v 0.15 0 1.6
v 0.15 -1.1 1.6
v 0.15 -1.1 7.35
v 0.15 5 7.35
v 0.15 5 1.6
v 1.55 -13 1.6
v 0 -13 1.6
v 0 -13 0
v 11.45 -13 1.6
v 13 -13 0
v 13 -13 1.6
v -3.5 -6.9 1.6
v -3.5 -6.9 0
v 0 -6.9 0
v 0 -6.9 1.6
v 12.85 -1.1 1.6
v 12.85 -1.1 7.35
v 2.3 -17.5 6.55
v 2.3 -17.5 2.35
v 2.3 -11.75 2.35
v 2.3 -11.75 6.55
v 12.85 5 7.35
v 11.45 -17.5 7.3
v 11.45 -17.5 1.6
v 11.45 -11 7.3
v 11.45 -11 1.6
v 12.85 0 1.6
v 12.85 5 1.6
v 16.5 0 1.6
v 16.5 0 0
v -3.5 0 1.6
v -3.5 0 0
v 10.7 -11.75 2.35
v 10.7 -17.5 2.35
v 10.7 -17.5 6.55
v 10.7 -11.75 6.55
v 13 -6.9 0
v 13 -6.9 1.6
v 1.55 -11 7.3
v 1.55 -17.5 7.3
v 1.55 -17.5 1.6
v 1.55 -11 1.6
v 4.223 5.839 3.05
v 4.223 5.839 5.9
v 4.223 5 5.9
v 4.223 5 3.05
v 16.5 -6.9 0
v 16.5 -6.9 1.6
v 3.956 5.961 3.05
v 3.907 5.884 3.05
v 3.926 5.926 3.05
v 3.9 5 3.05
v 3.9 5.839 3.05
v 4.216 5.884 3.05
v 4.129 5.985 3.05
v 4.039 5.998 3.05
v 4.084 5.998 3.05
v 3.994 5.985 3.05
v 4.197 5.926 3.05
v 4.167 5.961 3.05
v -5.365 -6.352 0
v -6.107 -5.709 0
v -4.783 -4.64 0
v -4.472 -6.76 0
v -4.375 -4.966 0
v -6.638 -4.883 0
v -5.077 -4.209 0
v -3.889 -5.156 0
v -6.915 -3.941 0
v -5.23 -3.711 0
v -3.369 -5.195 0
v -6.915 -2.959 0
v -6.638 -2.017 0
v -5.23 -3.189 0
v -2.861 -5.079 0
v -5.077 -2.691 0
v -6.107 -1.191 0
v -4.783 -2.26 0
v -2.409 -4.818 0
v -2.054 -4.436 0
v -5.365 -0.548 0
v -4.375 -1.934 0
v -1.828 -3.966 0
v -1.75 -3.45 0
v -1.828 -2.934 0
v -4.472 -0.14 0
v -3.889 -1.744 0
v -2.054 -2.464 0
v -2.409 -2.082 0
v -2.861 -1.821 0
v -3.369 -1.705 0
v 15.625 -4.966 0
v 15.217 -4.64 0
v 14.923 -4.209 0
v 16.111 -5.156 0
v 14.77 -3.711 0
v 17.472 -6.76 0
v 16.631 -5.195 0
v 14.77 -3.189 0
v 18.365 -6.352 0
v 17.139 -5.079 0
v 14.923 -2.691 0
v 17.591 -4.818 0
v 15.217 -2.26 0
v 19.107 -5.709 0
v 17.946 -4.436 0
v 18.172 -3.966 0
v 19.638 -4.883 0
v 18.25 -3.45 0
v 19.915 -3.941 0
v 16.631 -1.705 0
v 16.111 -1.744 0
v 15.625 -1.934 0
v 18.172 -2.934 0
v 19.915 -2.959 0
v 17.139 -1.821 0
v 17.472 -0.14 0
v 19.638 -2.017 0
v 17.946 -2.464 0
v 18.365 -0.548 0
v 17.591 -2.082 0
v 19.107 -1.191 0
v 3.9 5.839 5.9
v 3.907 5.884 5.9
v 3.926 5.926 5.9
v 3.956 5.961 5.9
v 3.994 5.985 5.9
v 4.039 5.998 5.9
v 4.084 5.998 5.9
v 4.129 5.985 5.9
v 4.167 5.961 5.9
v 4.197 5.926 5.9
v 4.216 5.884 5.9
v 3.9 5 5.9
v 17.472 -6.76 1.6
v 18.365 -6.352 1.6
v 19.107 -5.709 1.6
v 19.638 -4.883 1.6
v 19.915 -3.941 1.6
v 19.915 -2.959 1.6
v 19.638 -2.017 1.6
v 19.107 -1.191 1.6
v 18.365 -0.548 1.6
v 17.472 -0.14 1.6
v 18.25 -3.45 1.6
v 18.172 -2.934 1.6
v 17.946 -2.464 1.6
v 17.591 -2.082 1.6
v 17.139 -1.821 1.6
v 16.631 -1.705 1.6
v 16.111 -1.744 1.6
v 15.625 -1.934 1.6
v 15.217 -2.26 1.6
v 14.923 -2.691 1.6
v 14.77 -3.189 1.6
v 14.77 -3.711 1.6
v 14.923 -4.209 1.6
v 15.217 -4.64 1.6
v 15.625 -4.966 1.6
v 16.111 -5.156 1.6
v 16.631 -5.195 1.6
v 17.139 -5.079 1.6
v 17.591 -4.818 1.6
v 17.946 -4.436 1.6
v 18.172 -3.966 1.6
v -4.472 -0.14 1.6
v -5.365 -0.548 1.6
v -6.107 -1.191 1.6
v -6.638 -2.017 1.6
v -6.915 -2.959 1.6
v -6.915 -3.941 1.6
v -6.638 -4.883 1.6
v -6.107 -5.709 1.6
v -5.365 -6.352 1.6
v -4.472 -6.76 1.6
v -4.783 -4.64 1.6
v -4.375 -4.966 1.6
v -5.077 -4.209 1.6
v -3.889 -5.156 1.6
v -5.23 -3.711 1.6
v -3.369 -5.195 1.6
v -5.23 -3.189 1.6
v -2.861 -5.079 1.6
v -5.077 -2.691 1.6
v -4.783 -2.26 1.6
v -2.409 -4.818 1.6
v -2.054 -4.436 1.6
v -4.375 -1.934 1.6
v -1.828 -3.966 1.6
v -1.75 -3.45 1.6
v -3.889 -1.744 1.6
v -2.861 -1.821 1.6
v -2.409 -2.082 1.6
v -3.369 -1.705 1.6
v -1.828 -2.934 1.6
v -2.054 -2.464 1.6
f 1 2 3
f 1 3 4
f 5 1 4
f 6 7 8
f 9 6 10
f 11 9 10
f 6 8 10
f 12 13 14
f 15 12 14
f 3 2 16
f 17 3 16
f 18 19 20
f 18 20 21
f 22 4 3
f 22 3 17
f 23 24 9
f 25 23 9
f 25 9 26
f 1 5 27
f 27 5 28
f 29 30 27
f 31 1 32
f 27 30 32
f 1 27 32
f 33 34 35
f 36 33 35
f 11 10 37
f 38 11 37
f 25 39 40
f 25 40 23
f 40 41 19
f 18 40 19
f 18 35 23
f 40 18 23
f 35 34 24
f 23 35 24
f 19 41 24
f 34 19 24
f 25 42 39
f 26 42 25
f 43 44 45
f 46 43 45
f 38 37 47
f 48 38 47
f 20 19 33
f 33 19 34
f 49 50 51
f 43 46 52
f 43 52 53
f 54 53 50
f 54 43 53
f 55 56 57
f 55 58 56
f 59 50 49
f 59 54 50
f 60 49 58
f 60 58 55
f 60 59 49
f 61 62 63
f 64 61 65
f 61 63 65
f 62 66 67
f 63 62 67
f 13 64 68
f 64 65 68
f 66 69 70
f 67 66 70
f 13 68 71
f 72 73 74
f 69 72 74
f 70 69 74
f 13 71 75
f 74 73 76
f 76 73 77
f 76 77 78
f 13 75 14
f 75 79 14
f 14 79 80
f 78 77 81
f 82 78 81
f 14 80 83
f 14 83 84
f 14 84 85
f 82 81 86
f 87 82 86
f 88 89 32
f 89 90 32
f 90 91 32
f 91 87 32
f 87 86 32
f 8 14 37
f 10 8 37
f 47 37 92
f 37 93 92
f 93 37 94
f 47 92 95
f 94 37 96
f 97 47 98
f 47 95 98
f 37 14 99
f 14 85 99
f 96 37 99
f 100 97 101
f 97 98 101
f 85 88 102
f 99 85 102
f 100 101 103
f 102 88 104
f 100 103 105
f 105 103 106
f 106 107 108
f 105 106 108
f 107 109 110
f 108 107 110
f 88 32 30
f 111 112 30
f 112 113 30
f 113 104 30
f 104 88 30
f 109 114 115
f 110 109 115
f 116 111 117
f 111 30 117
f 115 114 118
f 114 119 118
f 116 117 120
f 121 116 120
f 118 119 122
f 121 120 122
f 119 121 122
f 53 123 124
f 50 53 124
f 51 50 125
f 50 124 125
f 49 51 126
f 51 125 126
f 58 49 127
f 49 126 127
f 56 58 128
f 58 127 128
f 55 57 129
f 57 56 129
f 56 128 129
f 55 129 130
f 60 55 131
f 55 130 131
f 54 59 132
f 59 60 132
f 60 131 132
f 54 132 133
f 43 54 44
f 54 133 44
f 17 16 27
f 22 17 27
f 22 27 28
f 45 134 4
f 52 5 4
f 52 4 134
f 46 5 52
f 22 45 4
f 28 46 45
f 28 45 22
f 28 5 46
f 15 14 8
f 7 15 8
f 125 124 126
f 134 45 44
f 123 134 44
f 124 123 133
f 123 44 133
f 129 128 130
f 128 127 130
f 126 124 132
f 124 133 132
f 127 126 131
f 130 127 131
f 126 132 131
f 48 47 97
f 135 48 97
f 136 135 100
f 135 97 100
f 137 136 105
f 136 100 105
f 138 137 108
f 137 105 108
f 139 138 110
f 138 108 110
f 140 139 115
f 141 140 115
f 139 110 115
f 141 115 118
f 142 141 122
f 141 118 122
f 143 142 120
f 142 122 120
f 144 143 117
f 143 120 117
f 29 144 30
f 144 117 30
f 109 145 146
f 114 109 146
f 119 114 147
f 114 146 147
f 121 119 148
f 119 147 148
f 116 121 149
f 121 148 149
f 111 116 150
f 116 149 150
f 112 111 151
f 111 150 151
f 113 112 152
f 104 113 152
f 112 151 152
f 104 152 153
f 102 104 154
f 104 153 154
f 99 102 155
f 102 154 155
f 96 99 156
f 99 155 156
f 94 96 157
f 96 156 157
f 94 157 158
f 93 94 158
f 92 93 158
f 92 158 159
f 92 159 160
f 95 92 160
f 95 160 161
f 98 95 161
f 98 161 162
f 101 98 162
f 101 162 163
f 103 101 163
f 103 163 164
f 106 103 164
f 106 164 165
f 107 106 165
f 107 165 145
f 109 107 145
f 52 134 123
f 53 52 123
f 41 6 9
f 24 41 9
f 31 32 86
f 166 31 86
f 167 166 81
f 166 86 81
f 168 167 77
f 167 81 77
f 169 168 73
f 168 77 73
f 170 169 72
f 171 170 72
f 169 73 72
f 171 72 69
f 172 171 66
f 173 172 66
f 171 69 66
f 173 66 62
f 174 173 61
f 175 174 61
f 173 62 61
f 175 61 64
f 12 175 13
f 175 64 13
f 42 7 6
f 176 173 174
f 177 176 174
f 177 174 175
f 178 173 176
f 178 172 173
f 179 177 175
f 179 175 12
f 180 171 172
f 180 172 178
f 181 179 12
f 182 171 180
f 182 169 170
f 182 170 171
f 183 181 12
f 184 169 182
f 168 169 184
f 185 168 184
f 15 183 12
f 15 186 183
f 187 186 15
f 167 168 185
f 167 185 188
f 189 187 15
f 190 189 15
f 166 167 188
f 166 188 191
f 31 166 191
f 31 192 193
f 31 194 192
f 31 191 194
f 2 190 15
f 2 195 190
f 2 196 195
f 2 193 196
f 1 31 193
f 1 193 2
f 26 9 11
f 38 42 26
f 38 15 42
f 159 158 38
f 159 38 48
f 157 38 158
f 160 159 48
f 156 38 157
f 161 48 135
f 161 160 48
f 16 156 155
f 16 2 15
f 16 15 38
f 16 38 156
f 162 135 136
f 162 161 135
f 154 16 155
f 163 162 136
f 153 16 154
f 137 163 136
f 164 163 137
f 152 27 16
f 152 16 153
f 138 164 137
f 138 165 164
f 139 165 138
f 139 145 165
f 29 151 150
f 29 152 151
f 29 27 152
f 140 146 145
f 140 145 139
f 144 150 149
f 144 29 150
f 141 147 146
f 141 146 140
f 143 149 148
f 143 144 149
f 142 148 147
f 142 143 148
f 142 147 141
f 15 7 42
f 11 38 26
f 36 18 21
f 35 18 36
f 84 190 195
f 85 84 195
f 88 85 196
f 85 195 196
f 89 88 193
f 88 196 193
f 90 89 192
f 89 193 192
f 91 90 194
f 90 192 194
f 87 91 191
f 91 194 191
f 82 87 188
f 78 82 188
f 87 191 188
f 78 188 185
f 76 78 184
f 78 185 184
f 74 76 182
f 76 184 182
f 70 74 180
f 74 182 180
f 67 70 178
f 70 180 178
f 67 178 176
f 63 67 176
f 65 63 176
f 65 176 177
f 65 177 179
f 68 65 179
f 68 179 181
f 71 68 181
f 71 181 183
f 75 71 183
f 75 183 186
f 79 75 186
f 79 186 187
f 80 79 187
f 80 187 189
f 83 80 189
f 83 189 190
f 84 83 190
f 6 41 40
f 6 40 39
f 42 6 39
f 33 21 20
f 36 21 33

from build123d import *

# Parameters (mm, degrees)
BOSS_EXTRUDE1_DEPTH = 1.6
SKETCH2_W           = 9.9
SKETCH2_H           = 6.5
BOSS_EXTRUDE2_DEPTH = 5.7
SKETCH3_W           = 8.4
SKETCH3_H           = 4.2
CUT_EXTRUDE1_DEPTH  = 5.75
SKETCH4_R           = 1.75
CUT_EXTRUDE2_DEPTH  = 5.75
SKETCH5_W           = 12.7
SKETCH5_H           = 6.1
BOSS_EXTRUDE3_DEPTH = 5.75
BOSS_EXTRUDE4_DEPTH = 5.75
SKETCH8_W           = 1.45
SKETCH8_H           = 1.30003701
CUT_EXTRUDE3_DEPTH  = 10


with BuildPart() as part:
    # Sketch1 → Boss-Extrude1 (new body)
    with BuildSketch(Plane.XY):
        with BuildLine():
            Line((0, -6.9), (0, -13))
            Line((0, -13), (13, -13))
            Line((13, -13), (13, -6.9))
            Line((13, -6.9), (16.5, -6.9))
            ThreePointArc((16.5, -6.9), (19.95, -3.45), (16.5, 0))
            Line((16.5, 0), (13, 0))
            Line((13, 0), (0, 0))
            Line((0, 0), (-3.5, 0))
            ThreePointArc((-3.5, 0), (-6.95, -3.45), (-3.5, -6.9))
            Line((-3.5, -6.9), (0, -6.9))
        make_face()
    extrude(amount=BOSS_EXTRUDE1_DEPTH)

    # Sketch2 → Boss-Extrude2 (add)
    with BuildSketch(Plane.XY.offset(1.6)):
        with Locations((6.5, -14.25)):
            Rectangle(SKETCH2_W, SKETCH2_H)
    extrude(amount=BOSS_EXTRUDE2_DEPTH)

    # Sketch3 → Cut-Extrude1 (cut)
    with BuildSketch(Plane.XZ.offset(17.5)):
        with Locations((6.5, 4.45)):
            Rectangle(SKETCH3_W, SKETCH3_H)
    extrude(amount=-CUT_EXTRUDE1_DEPTH, mode=Mode.SUBTRACT)

    # Sketch4 → Cut-Extrude2 (cut)
    with BuildSketch(Plane.XY.offset(1.6)):
        with Locations((-3.5, -3.45)):
            Circle(SKETCH4_R)
        with Locations((16.5, -3.45)):
            Circle(SKETCH4_R)
    extrude(amount=-CUT_EXTRUDE2_DEPTH, mode=Mode.SUBTRACT)

    # Sketch5 → Boss-Extrude3 (add)
    with BuildSketch(Plane.XY.offset(1.6)):
        with Locations((6.5, 1.95)):
            Rectangle(SKETCH5_W, SKETCH5_H)
    extrude(amount=BOSS_EXTRUDE3_DEPTH)

    # Sketch7 → Boss-Extrude4 (add)
    with BuildSketch(Plane.XY.offset(7.35)):
        with BuildLine():
            Line((3.9, 5), (3.9, 5.838508632))
            ThreePointArc((3.9, 5.838508632), (4.061491368, 6), (4.222982736, 5.838508632))
            Line((4.222982736, 5.838508632), (4.222982736, 5))
            Line((4.222982736, 5), (3.9, 5))
        make_face()
    extrude(amount=-BOSS_EXTRUDE4_DEPTH)

    # Sketch8 → Cut-Extrude3 (cut)
    with BuildSketch(Plane(origin=(12.85, 0, 0), x_dir=(0, 0, -1), z_dir=(1, 0, 0))):
        with Locations((-6.625, 5.650018505)):
            Rectangle(SKETCH8_W, SKETCH8_H)
        with Locations((-2.325, 5.650018505)):
            Rectangle(SKETCH8_W, SKETCH8_H)
    extrude(amount=-CUT_EXTRUDE3_DEPTH, mode=Mode.SUBTRACT)


solid = part.part
